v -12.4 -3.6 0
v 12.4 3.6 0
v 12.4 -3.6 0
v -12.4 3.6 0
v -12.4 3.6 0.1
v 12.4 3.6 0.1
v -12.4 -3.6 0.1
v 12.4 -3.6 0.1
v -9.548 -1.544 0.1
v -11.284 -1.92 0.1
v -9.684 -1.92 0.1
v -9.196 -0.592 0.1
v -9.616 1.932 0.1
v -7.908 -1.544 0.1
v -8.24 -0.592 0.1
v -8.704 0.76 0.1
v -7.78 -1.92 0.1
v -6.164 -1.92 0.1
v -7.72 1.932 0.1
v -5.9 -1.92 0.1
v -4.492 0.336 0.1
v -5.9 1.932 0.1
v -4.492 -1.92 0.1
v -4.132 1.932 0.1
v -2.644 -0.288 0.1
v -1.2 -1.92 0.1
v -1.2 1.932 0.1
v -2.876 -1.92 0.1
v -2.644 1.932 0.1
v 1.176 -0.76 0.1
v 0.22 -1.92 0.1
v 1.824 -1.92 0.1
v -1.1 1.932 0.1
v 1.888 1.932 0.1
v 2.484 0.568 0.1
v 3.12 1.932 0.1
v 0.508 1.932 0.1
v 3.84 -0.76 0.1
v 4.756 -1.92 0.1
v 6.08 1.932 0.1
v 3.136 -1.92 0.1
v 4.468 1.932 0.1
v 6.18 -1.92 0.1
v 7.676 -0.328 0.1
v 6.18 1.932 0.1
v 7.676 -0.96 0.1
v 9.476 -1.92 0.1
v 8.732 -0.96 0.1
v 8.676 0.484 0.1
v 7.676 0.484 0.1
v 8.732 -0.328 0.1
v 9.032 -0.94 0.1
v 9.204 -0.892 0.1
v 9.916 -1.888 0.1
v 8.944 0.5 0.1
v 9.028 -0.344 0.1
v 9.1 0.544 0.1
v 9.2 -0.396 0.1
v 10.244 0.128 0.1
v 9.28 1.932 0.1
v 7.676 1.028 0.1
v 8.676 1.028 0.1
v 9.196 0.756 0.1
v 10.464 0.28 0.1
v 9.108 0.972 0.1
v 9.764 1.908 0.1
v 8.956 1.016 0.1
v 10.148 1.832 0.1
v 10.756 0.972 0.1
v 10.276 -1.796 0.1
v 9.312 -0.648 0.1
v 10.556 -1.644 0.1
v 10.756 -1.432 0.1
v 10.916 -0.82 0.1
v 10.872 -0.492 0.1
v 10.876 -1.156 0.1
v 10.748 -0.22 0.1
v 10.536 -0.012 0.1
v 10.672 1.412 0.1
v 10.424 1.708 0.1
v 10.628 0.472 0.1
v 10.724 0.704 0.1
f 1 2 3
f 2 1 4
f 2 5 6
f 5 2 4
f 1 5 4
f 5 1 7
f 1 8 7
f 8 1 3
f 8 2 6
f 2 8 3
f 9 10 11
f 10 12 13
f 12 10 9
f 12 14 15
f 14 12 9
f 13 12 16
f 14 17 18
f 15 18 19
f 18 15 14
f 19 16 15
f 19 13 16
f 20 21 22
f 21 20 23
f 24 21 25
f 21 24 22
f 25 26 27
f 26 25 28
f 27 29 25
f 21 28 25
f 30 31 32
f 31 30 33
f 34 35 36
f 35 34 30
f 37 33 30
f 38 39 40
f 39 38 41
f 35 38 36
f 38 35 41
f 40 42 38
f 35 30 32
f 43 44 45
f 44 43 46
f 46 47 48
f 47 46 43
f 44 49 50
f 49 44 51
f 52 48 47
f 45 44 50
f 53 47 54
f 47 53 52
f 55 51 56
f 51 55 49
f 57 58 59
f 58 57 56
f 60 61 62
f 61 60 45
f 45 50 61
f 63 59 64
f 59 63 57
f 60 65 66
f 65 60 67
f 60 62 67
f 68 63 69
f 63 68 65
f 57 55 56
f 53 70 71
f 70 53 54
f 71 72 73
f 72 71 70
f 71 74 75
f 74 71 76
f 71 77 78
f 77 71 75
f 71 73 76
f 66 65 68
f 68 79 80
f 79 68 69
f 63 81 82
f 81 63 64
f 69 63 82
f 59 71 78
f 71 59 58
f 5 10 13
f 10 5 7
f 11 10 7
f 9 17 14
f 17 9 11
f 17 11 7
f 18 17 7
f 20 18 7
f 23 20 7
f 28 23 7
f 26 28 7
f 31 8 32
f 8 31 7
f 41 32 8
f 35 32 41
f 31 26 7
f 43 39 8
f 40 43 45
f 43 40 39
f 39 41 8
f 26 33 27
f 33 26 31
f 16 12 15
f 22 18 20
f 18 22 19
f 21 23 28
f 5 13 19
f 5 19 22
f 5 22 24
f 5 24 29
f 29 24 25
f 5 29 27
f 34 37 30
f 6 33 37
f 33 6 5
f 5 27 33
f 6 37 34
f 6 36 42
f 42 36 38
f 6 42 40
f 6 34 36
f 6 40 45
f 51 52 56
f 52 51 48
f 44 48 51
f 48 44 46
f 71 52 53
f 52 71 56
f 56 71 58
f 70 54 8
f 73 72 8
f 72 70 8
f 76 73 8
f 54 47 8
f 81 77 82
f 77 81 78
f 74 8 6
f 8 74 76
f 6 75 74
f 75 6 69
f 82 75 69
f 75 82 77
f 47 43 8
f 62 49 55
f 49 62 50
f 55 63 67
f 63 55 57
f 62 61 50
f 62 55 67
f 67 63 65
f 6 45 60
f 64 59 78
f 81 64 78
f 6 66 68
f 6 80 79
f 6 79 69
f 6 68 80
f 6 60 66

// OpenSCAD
// file: ../p/4-4edge.scad
use <../lib.scad>
$fa=1; $fs=0.2;
function ldraw_lib__4_4edge(realsolid=false) = [
// 0 Circle 1.0
// 0 Name: 4-4edge.dat
// 0 Author: James Jessiman
// 0 !LDRAW_ORG Primitive UPDATE 2017-01
// 0 !LICENSE Licensed under CC BY 2.0 and CC BY 4.0 : see CAreadme.txt
// 
// 0 BFC CERTIFY CCW
  [0,"BFC","CERTIFY"],
  [0,"BFC","CCW"],
// 
// 0 !HISTORY 1998-12-15 [PTadmin] Official Update 1998-10
// 0 !HISTORY 2005-12-28 [PTadmin] Official Update 2005-01
// 0 !HISTORY 2007-06-24 [PTadmin] Header formatted for Contributor Agreement
// 0 !HISTORY 2008-07-01 [PTadmin] Official Update 2008-01
// 0 !HISTORY 2017-01-15 [Steffen] BFCed
// 0 !HISTORY 2017-12-30 [PTadmin] Official Update 2017-01
// 
// 
// 2 24 1 0 0 0.9239 0 0.3827
  [2,24,1,0,0,0.9239,0,0.3827],
// 2 24 0.9239 0 0.3827 0.7071 0 0.7071
  [2,24,0.9239,0,0.3827,0.7071,0,0.7071],
// 2 24 0.7071 0 0.7071 0.3827 0 0.9239
  [2,24,0.7071,0,0.7071,0.3827,0,0.9239],
// 2 24 0.3827 0 0.9239 0 0 1
  [2,24,0.3827,0,0.9239,0,0,1],
// 2 24 0 0 1 -0.3827 0 0.9239
  [2,24,0,0,1,-0.3827,0,0.9239],
// 2 24 -0.3827 0 0.9239 -0.7071 0 0.7071
  [2,24,-0.3827,0,0.9239,-0.7071,0,0.7071],
// 2 24 -0.7071 0 0.7071 -0.9239 0 0.3827
  [2,24,-0.7071,0,0.7071,-0.9239,0,0.3827],
// 2 24 -0.9239 0 0.3827 -1 0 -0
  [2,24,-0.9239,0,0.3827,-1,0,-0],
// 2 24 -1 0 -0 -0.9239 0 -0.3827
  [2,24,-1,0,-0,-0.9239,0,-0.3827],
// 2 24 -0.9239 0 -0.3827 -0.7071 0 -0.7071
  [2,24,-0.9239,0,-0.3827,-0.7071,0,-0.7071],
// 2 24 -0.7071 0 -0.7071 -0.3827 0 -0.9239
  [2,24,-0.7071,0,-0.7071,-0.3827,0,-0.9239],
// 2 24 -0.3827 0 -0.9239 0 0 -1
  [2,24,-0.3827,0,-0.9239,0,0,-1],
// 2 24 0 0 -1 0.3827 0 -0.9239
  [2,24,0,0,-1,0.3827,0,-0.9239],
// 2 24 0.3827 0 -0.9239 0.7071 0 -0.7071
  [2,24,0.3827,0,-0.9239,0.7071,0,-0.7071],
// 2 24 0.7071 0 -0.7071 0.9239 0 -0.3827
  [2,24,0.7071,0,-0.7071,0.9239,0,-0.3827],
// 2 24 0.9239 0 -0.3827 1 0 0
  [2,24,0.9239,0,-0.3827,1,0,0],
];
module ldraw_lib__4_4edge(step=0, col=false, unit=2/5, alt=false, line=0.2, solid=!$preview)
    makepoly(ldraw_lib__4_4edge(solid), step=step, col=col, unit=unit, alt=alt, line=line, solid=solid);
ldraw_lib__4_4edge(line=0.2);
// file: ../p/4-4disc.scad
use <../lib.scad>
$fa=1; $fs=0.2;
function ldraw_lib__4_4disc(realsolid=false) = [
// 0 Disc 1.0
// 0 Name: 4-4disc.dat
// 0 Author: James Jessiman
// 0 !LDRAW_ORG Primitive UPDATE 2002-02
// 0 !LICENSE Licensed under CC BY 2.0 and CC BY 4.0 : see CAreadme.txt
// 
// 0 BFC CERTIFY CCW
  [0,"BFC","CERTIFY"],
  [0,"BFC","CCW"],
// 
// 0 !HISTORY 1998-12-15 [PTadmin] Official Update 1998-10
// 0 !HISTORY 2002-03-23 [sbliss] Added BFC statement
// 0 !HISTORY 2002-04-25 [PTadmin] Official Update 2002-02
// 0 !HISTORY 2007-06-24 [PTadmin] Header formatted for Contributor Agreement
// 0 !HISTORY 2008-07-01 [PTadmin] Official Update 2008-01
// 
// 
// 3 16 0 0 0 1 0 0 0.9239 0 0.3827
  [3,16,0,0,0,1,0,0,0.9239,0,0.3827],
// 3 16 0 0 0 0.9239 0 0.3827 0.7071 0 0.7071
  [3,16,0,0,0,0.9239,0,0.3827,0.7071,0,0.7071],
// 3 16 0 0 0 0.7071 0 0.7071 0.3827 0 0.9239
  [3,16,0,0,0,0.7071,0,0.7071,0.3827,0,0.9239],
// 3 16 0 0 0 0.3827 0 0.9239 0 0 1
  [3,16,0,0,0,0.3827,0,0.9239,0,0,1],
// 3 16 0 0 0 0 0 1 -0.3827 0 0.9239
  [3,16,0,0,0,0,0,1,-0.3827,0,0.9239],
// 3 16 0 0 0 -0.3827 0 0.9239 -0.7071 0 0.7071
  [3,16,0,0,0,-0.3827,0,0.9239,-0.7071,0,0.7071],
// 3 16 0 0 0 -0.7071 0 0.7071 -0.9239 0 0.3827
  [3,16,0,0,0,-0.7071,0,0.7071,-0.9239,0,0.3827],
// 3 16 0 0 0 -0.9239 0 0.3827 -1 0 -0
  [3,16,0,0,0,-0.9239,0,0.3827,-1,0,-0],
// 3 16 0 0 0 -1 0 -0 -0.9239 0 -0.3827
  [3,16,0,0,0,-1,0,-0,-0.9239,0,-0.3827],
// 3 16 0 0 0 -0.9239 0 -0.3827 -0.7071 0 -0.7071
  [3,16,0,0,0,-0.9239,0,-0.3827,-0.7071,0,-0.7071],
// 3 16 0 0 0 -0.7071 0 -0.7071 -0.3827 0 -0.9239
  [3,16,0,0,0,-0.7071,0,-0.7071,-0.3827,0,-0.9239],
// 3 16 0 0 0 -0.3827 0 -0.9239 0 0 -1
  [3,16,0,0,0,-0.3827,0,-0.9239,0,0,-1],
// 3 16 0 0 0 0 0 -1 0.3827 0 -0.9239
  [3,16,0,0,0,0,0,-1,0.3827,0,-0.9239],
// 3 16 0 0 0 0.3827 0 -0.9239 0.7071 0 -0.7071
  [3,16,0,0,0,0.3827,0,-0.9239,0.7071,0,-0.7071],
// 3 16 0 0 0 0.7071 0 -0.7071 0.9239 0 -0.3827
  [3,16,0,0,0,0.7071,0,-0.7071,0.9239,0,-0.3827],
// 3 16 0 0 0 0.9239 0 -0.3827 1 0 0
  [3,16,0,0,0,0.9239,0,-0.3827,1,0,0],
// 0
];
module ldraw_lib__4_4disc(step=0, col=false, unit=2/5, alt=false, line=0.2, solid=!$preview)
    makepoly(ldraw_lib__4_4disc(solid), step=step, col=col, unit=unit, alt=alt, line=line, solid=solid);
ldraw_lib__4_4disc(line=0.2);
// file: ../p/4-4cyli.scad
use <../lib.scad>
$fa=1; $fs=0.2;
function ldraw_lib__4_4cyli(realsolid=false) = [
// 0 Cylinder 1.0
// 0 Name: 4-4cyli.dat
// 0 Author: James Jessiman
// 0 !LDRAW_ORG Primitive UPDATE 2005-01
// 0 !LICENSE Licensed under CC BY 2.0 and CC BY 4.0 : see CAreadme.txt
// 
// 0 BFC CERTIFY CCW
  [0,"BFC","CERTIFY"],
  [0,"BFC","CCW"],
// 
// 0 !HISTORY 1998-12-15 [PTadmin] Official Update 1998-10
// 0 !HISTORY 2002-03-23 [sbliss] Added BFC statement; merged headers from files in distributions LDraw 0.27 and Complete.
// 0 !HISTORY 2002-04-25 [PTadmin] Official Update 2002-02
// 0 !HISTORY 2004-12-14 [guyvivan] BFC CCW
// 0 !HISTORY 2005-12-28 [PTadmin] Official Update 2005-01
// 0 !HISTORY 2007-06-24 [PTadmin] Header formatted for Contributor Agreement
// 0 !HISTORY 2008-07-01 [PTadmin] Official Update 2008-01
// 
// 
// 4 16 1 1 0 0.9239 1 0.3827 0.9239 0 0.3827 1 0 0
  [4,16,1,1,0,0.9239,1,0.3827,0.9239,0,0.3827,1,0,0],
// 5 24 1 0 0 1 1 0 0.9239 0 0.3827 0.9239 0 -0.3827
  [5,24,1,0,0,1,1,0,0.9239,0,0.3827,0.9239,0,-0.3827],
// 4 16 0.9239 1 0.3827 0.7071 1 0.7071 0.7071 0 0.7071 0.9239 0 0.3827
  [4,16,0.9239,1,0.3827,0.7071,1,0.7071,0.7071,0,0.7071,0.9239,0,0.3827],
// 5 24 0.9239 0 0.3827 0.9239 1 0.3827 0.7071 0 0.7071 1 0 0
  [5,24,0.9239,0,0.3827,0.9239,1,0.3827,0.7071,0,0.7071,1,0,0],
// 4 16 0.7071 1 0.7071 0.3827 1 0.9239 0.3827 0 0.9239 0.7071 0 0.7071
  [4,16,0.7071,1,0.7071,0.3827,1,0.9239,0.3827,0,0.9239,0.7071,0,0.7071],
// 5 24 0.7071 0 0.7071 0.7071 1 0.7071 0.3827 0 0.9239 0.9239 0 0.3827
  [5,24,0.7071,0,0.7071,0.7071,1,0.7071,0.3827,0,0.9239,0.9239,0,0.3827],
// 4 16 0.3827 1 0.9239 0 1 1 0 0 1 0.3827 0 0.9239
  [4,16,0.3827,1,0.9239,0,1,1,0,0,1,0.3827,0,0.9239],
// 5 24 0.3827 0 0.9239 0.3827 1 0.9239 0 0 1 0.7071 0 0.7071
  [5,24,0.3827,0,0.9239,0.3827,1,0.9239,0,0,1,0.7071,0,0.7071],
// 4 16 0 1 1 -0.3827 1 0.9239 -0.3827 0 0.9239 0 0 1
  [4,16,0,1,1,-0.3827,1,0.9239,-0.3827,0,0.9239,0,0,1],
// 5 24 0 0 1 0 1 1 -0.3827 0 0.9239 0.3827 0 0.9239
  [5,24,0,0,1,0,1,1,-0.3827,0,0.9239,0.3827,0,0.9239],
// 4 16 -0.3827 1 0.9239 -0.7071 1 0.7071 -0.7071 0 0.7071 -0.3827 0 0.9239
  [4,16,-0.3827,1,0.9239,-0.7071,1,0.7071,-0.7071,0,0.7071,-0.3827,0,0.9239],
// 5 24 -0.3827 0 0.9239 -0.3827 1 0.9239 -0.7071 0 0.7071 0 0 1
  [5,24,-0.3827,0,0.9239,-0.3827,1,0.9239,-0.7071,0,0.7071,0,0,1],
// 4 16 -0.7071 1 0.7071 -0.9239 1 0.3827 -0.9239 0 0.3827 -0.7071 0 0.7071
  [4,16,-0.7071,1,0.7071,-0.9239,1,0.3827,-0.9239,0,0.3827,-0.7071,0,0.7071],
// 5 24 -0.7071 0 0.7071 -0.7071 1 0.7071 -0.9239 0 0.3827 -0.3827 0 0.9239
  [5,24,-0.7071,0,0.7071,-0.7071,1,0.7071,-0.9239,0,0.3827,-0.3827,0,0.9239],
// 4 16 -0.9239 1 0.3827 -1 1 0 -1 0 0 -0.9239 0 0.3827
  [4,16,-0.9239,1,0.3827,-1,1,0,-1,0,0,-0.9239,0,0.3827],
// 5 24 -0.9239 0 0.3827 -0.9239 1 0.3827 -1 0 0 -0.7071 0 0.7071
  [5,24,-0.9239,0,0.3827,-0.9239,1,0.3827,-1,0,0,-0.7071,0,0.7071],
// 4 16 -1 1 0 -0.9239 1 -0.3827 -0.9239 0 -0.3827 -1 0 0
  [4,16,-1,1,0,-0.9239,1,-0.3827,-0.9239,0,-0.3827,-1,0,0],
// 5 24 -1 0 0 -1 1 0 -0.9239 0 -0.3827 -0.9239 0 0.3827
  [5,24,-1,0,0,-1,1,0,-0.9239,0,-0.3827,-0.9239,0,0.3827],
// 4 16 -0.9239 1 -0.3827 -0.7071 1 -0.7071 -0.7071 0 -0.7071 -0.9239 0 -0.3827
  [4,16,-0.9239,1,-0.3827,-0.7071,1,-0.7071,-0.7071,0,-0.7071,-0.9239,0,-0.3827],
// 5 24 -0.9239 0 -0.3827 -0.9239 1 -0.3827 -0.7071 0 -0.7071 -1 0 0
  [5,24,-0.9239,0,-0.3827,-0.9239,1,-0.3827,-0.7071,0,-0.7071,-1,0,0],
// 4 16 -0.7071 1 -0.7071 -0.3827 1 -0.9239 -0.3827 0 -0.9239 -0.7071 0 -0.7071
  [4,16,-0.7071,1,-0.7071,-0.3827,1,-0.9239,-0.3827,0,-0.9239,-0.7071,0,-0.7071],
// 5 24 -0.7071 0 -0.7071 -0.7071 1 -0.7071 -0.3827 0 -0.9239 -0.9239 0 -0.3827
  [5,24,-0.7071,0,-0.7071,-0.7071,1,-0.7071,-0.3827,0,-0.9239,-0.9239,0,-0.3827],
// 4 16 -0.3827 1 -0.9239 0 1 -1 0 0 -1 -0.3827 0 -0.9239
  [4,16,-0.3827,1,-0.9239,0,1,-1,0,0,-1,-0.3827,0,-0.9239],
// 5 24 -0.3827 0 -0.9239 -0.3827 1 -0.9239 0 0 -1 -0.7071 0 -0.7071
  [5,24,-0.3827,0,-0.9239,-0.3827,1,-0.9239,0,0,-1,-0.7071,0,-0.7071],
// 4 16 0 1 -1 0.3827 1 -0.9239 0.3827 0 -0.9239 0 0 -1
  [4,16,0,1,-1,0.3827,1,-0.9239,0.3827,0,-0.9239,0,0,-1],
// 5 24 0 0 -1 0 1 -1 0.3827 0 -0.9239 -0.3827 0 -0.9239
  [5,24,0,0,-1,0,1,-1,0.3827,0,-0.9239,-0.3827,0,-0.9239],
// 4 16 0.3827 1 -0.9239 0.7071 1 -0.7071 0.7071 0 -0.7071 0.3827 0 -0.9239
  [4,16,0.3827,1,-0.9239,0.7071,1,-0.7071,0.7071,0,-0.7071,0.3827,0,-0.9239],
// 5 24 0.3827 0 -0.9239 0.3827 1 -0.9239 0.7071 0 -0.7071 0 0 -1
  [5,24,0.3827,0,-0.9239,0.3827,1,-0.9239,0.7071,0,-0.7071,0,0,-1],
// 4 16 0.7071 1 -0.7071 0.9239 1 -0.3827 0.9239 0 -0.3827 0.7071 0 -0.7071
  [4,16,0.7071,1,-0.7071,0.9239,1,-0.3827,0.9239,0,-0.3827,0.7071,0,-0.7071],
// 5 24 0.7071 0 -0.7071 0.7071 1 -0.7071 0.9239 0 -0.3827 0.3827 0 -0.9239
  [5,24,0.7071,0,-0.7071,0.7071,1,-0.7071,0.9239,0,-0.3827,0.3827,0,-0.9239],
// 4 16 0.9239 1 -0.3827 1 1 0 1 0 0 0.9239 0 -0.3827
  [4,16,0.9239,1,-0.3827,1,1,0,1,0,0,0.9239,0,-0.3827],
// 5 24 0.9239 0 -0.3827 0.9239 1 -0.3827 1 0 0 0.7071 0 -0.7071
  [5,24,0.9239,0,-0.3827,0.9239,1,-0.3827,1,0,0,0.7071,0,-0.7071],
// 0
];
module ldraw_lib__4_4cyli(step=0, col=false, unit=2/5, alt=false, line=0.2, solid=!$preview)
    makepoly(ldraw_lib__4_4cyli(solid), step=step, col=col, unit=unit, alt=alt, line=line, solid=solid);
ldraw_lib__4_4cyli(line=0.2);
// file: ../p/stud3.scad
use <../lib.scad>
use <4-4cyli.scad>
use <4-4disc.scad>
use <4-4edge.scad>
$fa=1; $fs=0.2;
function ldraw_lib__stud3(realsolid=false) = realsolid ? 
    [openscad(translate([0,0,-eps()], o=cylinder(4+eps(), r=4)),2)] : [
// 0 Stud Tube Solid
// 0 Name: stud3.dat
// 0 Author: James Jessiman
// 0 !LDRAW_ORG Primitive UPDATE 2012-01
// 0 !LICENSE Licensed under CC BY 2.0 and CC BY 4.0 : see CAreadme.txt
// 
// 0 BFC CERTIFY CCW
  [0,"BFC","CERTIFY"],
  [0,"BFC","CCW"],
// 
// 0 !HISTORY 2002-04-04 [sbliss] Modified for BFC compliance
// 0 !HISTORY 2002-04-25 [PTadmin] Official Update 2002-02
// 0 !HISTORY 2007-06-24 [PTadmin] Header formatted for Contributor Agreement
// 0 !HISTORY 2008-07-01 [PTadmin] Official Update 2008-01
// 0 !HISTORY 2012-02-16 [Philo] Changed to CCW
// 0 !HISTORY 2012-03-30 [PTadmin] Official Update 2012-01
// 
// 
// 1 16 0 -4 0 4 0 0 0 1 0 0 0 4 4-4edge.dat
  [1,16,0,-4,0,4,0,0,0,1,0,0,0,4, ldraw_lib__4_4edge(realsolid)],
// 1 16 0 0 0 4 0 0 0 1 0 0 0 4 4-4edge.dat
  [1,16,0,0,0,4,0,0,0,1,0,0,0,4, ldraw_lib__4_4edge(realsolid)],
// 1 16 0 -4 0 4 0 0 0 1 0 0 0 4 4-4disc.dat
  [1,16,0,-4,0,4,0,0,0,1,0,0,0,4, ldraw_lib__4_4disc(realsolid)],
// 1 16 0 -4 0 4 0 0 0 4 0 0 0 4 4-4cyli.dat
  [1,16,0,-4,0,4,0,0,0,4,0,0,0,4, ldraw_lib__4_4cyli(realsolid)],
];
module ldraw_lib__stud3(step=0, col=false, unit=2/5, alt=false, line=0.2, solid=!$preview)
    makepoly(ldraw_lib__stud3(solid), step=step, col=col, unit=unit, alt=alt, line=line, solid=solid);
ldraw_lib__stud3(line=0.2);
// file: ../p/stud.scad
use <../lib.scad>
use <4-4cyli.scad>
use <4-4disc.scad>
use <4-4edge.scad>
$fa=1; $fs=0.2;
function ldraw_lib__stud(realsolid=false) = realsolid ? 
    [openscad(translate([0,0,-eps()], o=cylinder(4+eps(), r=6)),2)] : [
// 0 Stud
// 0 Name: stud.dat
// 0 Author: James Jessiman
// 0 !LDRAW_ORG Primitive UPDATE 2012-01
// 0 !LICENSE Licensed under CC BY 2.0 and CC BY 4.0 : see CAreadme.txt
// 
// 0 BFC CERTIFY CCW
  [0,"BFC","CERTIFY"],
  [0,"BFC","CCW"],
// 
// 0 !HISTORY 2002-04-04 [sbliss] Modified for BFC compliance
// 0 !HISTORY 2002-04-25 [PTadmin] Official Update 2002-02
// 0 !HISTORY 2007-06-24 [PTadmin] Header formatted for Contributor Agreement
// 0 !HISTORY 2008-07-01 [PTadmin] Official Update 2008-01
// 0 !HISTORY 2012-02-16 [Philo] Changed to CCW
// 0 !HISTORY 2012-03-30 [PTadmin] Official Update 2012-01
// 
// 
// 1 16 0 0 0 6 0 0 0 1 0 0 0 6 4-4edge.dat
  [1,16,0,0,0,6,0,0,0,1,0,0,0,6, ldraw_lib__4_4edge(realsolid)],
// 1 16 0 -4 0 6 0 0 0 1 0 0 0 6 4-4edge.dat
  [1,16,0,-4,0,6,0,0,0,1,0,0,0,6, ldraw_lib__4_4edge(realsolid)],
// 1 16 0 0 0 6 0 0 0 -4 0 0 0 6 4-4cyli.dat
  [1,16,0,0,0,6,0,0,0,-4,0,0,0,6, ldraw_lib__4_4cyli(realsolid)],
// 1 16 0 -4 0 6 0 0 0 1 0 0 0 6 4-4disc.dat
  [1,16,0,-4,0,6,0,0,0,1,0,0,0,6, ldraw_lib__4_4disc(realsolid)],
];
module ldraw_lib__stud(step=0, col=false, unit=2/5, alt=false, line=0.2, solid=!$preview)
    makepoly(ldraw_lib__stud(solid), step=step, col=col, unit=unit, alt=alt, line=line, solid=solid);
ldraw_lib__stud(line=0.2);
// file: ../p/box5.scad
use <../lib.scad>
$fa=1; $fs=0.2;
function ldraw_lib__box5(realsolid=false) = [
// 0 Box with 5 Faces and All Edges
// 0 Name: box5.dat
// 0 Author: James Jessiman
// 0 !LDRAW_ORG Primitive UPDATE 2012-01
// 0 !LICENSE Licensed under CC BY 2.0 and CC BY 4.0 : see CAreadme.txt
// 
// 0 BFC CERTIFY CCW
  [0,"BFC","CERTIFY"],
  [0,"BFC","CCW"],
// 
// 0 !HISTORY 2002-04-03 [sbliss] Modified for BFC compliance
// 0 !HISTORY 2002-04-25 [PTadmin] Official Update 2002-02
// 0 !HISTORY 2007-06-24 [PTadmin] Header formatted for Contributor Agreement
// 0 !HISTORY 2008-07-01 [PTadmin] Official Update 2008-01
// 0 !HISTORY 2012-02-16 [Philo] Changed to CCW
// 0 !HISTORY 2012-03-30 [PTadmin] Official Update 2012-01
// 
// 
// 2 24 1 1 1 -1 1 1
  [2,24,1,1,1,-1,1,1],
// 2 24 -1 1 1 -1 1 -1
  [2,24,-1,1,1,-1,1,-1],
// 2 24 -1 1 -1 1 1 -1
  [2,24,-1,1,-1,1,1,-1],
// 2 24 1 1 -1 1 1 1
  [2,24,1,1,-1,1,1,1],
// 2 24 1 0 1 -1 0 1
  [2,24,1,0,1,-1,0,1],
// 2 24 -1 0 1 -1 0 -1
  [2,24,-1,0,1,-1,0,-1],
// 2 24 -1 0 -1 1 0 -1
  [2,24,-1,0,-1,1,0,-1],
// 2 24 1 0 -1 1 0 1
  [2,24,1,0,-1,1,0,1],
// 2 24 1 0 1 1 1 1
  [2,24,1,0,1,1,1,1],
// 2 24 -1 0 1 -1 1 1
  [2,24,-1,0,1,-1,1,1],
// 2 24 1 0 -1 1 1 -1
  [2,24,1,0,-1,1,1,-1],
// 2 24 -1 0 -1 -1 1 -1
  [2,24,-1,0,-1,-1,1,-1],
// 4 16 -1 1 1 1 1 1 1 1 -1 -1 1 -1
  [4,16,-1,1,1,1,1,1,1,1,-1,-1,1,-1],
// 4 16 -1 1 1 -1 0 1 1 0 1 1 1 1
  [4,16,-1,1,1,-1,0,1,1,0,1,1,1,1],
// 4 16 -1 1 -1 -1 0 -1 -1 0 1 -1 1 1
  [4,16,-1,1,-1,-1,0,-1,-1,0,1,-1,1,1],
// 4 16 1 1 -1 1 0 -1 -1 0 -1 -1 1 -1
  [4,16,1,1,-1,1,0,-1,-1,0,-1,-1,1,-1],
// 4 16 1 1 1 1 0 1 1 0 -1 1 1 -1
  [4,16,1,1,1,1,0,1,1,0,-1,1,1,-1],
];
module ldraw_lib__box5(step=0, col=false, unit=2/5, alt=false, line=0.2, solid=!$preview)
    makepoly(ldraw_lib__box5(solid), step=step, col=col, unit=unit, alt=alt, line=line, solid=solid);
ldraw_lib__box5(line=0.2);
// file: ../p/box4t.scad
use <../lib.scad>
$fa=1; $fs=0.2;
function ldraw_lib__box4t(realsolid=false) = [
// 0 Box with 4 Adjacent Faces and All Edges
// 0 Name: box4t.dat
// 0 Author: Tore Eriksson [Tore_Eriksson]
// 0 !LDRAW_ORG Primitive UPDATE 2003-02
// 0 !LICENSE Licensed under CC BY 2.0 and CC BY 4.0 : see CAreadme.txt
// 
// 0 BFC CERTIFY CCW
  [0,"BFC","CERTIFY"],
  [0,"BFC","CCW"],
// 
// 0 !HISTORY 1997-09-29 [PTadmin] Official Update 1997-15
// 0 !HISTORY 2002-08-31 [izanette] Modified with WINDZ for BFC compliance
// 0 !HISTORY 2003-08-01 [PTadmin] Official Update 2003-02
// 0 !HISTORY 2007-06-24 [PTadmin] Header formatted for Contributor Agreement
// 0 !HISTORY 2008-07-01 [PTadmin] Official Update 2008-01
// 
// 
// 2 24 1 1 1 -1 1 1
  [2,24,1,1,1,-1,1,1],
// 2 24 -1 1 1 -1 1 -1
  [2,24,-1,1,1,-1,1,-1],
// 2 24 -1 1 -1 1 1 -1
  [2,24,-1,1,-1,1,1,-1],
// 2 24 1 1 -1 1 1 1
  [2,24,1,1,-1,1,1,1],
// 2 24 1 0 1 -1 0 1
  [2,24,1,0,1,-1,0,1],
// 2 24 -1 0 1 -1 0 -1
  [2,24,-1,0,1,-1,0,-1],
// 2 24 -1 0 -1 1 0 -1
  [2,24,-1,0,-1,1,0,-1],
// 2 24 1 0 -1 1 0 1
  [2,24,1,0,-1,1,0,1],
// 2 24 1 0 1 1 1 1
  [2,24,1,0,1,1,1,1],
// 2 24 -1 0 1 -1 1 1
  [2,24,-1,0,1,-1,1,1],
// 2 24 1 0 -1 1 1 -1
  [2,24,1,0,-1,1,1,-1],
// 2 24 -1 0 -1 -1 1 -1
  [2,24,-1,0,-1,-1,1,-1],
// 4 16 1 1 1 1 1 -1 -1 1 -1 -1 1 1
  [4,16,1,1,1,1,1,-1,-1,1,-1,-1,1,1],
// 4 16 1 1 1 -1 1 1 -1 0 1 1 0 1
  [4,16,1,1,1,-1,1,1,-1,0,1,1,0,1],
// 4 16 -1 1 1 -1 1 -1 -1 0 -1 -1 0 1
  [4,16,-1,1,1,-1,1,-1,-1,0,-1,-1,0,1],
// 0 4 16 -1 1 -1 -1 0 -1 1 0 -1 1 1 -1
// 4 16 1 1 -1 1 1 1 1 0 1 1 0 -1
  [4,16,1,1,-1,1,1,1,1,0,1,1,0,-1],
// 0
];
module ldraw_lib__box4t(step=0, col=false, unit=2/5, alt=false, line=0.2, solid=!$preview)
    makepoly(ldraw_lib__box4t(solid), step=step, col=col, unit=unit, alt=alt, line=line, solid=solid);
ldraw_lib__box4t(line=0.2);
// file: s/3004s01.scad
use <../../lib.scad>
use <../../p/box4t.scad>
use <../../p/box5.scad>
use <../../p/stud.scad>
use <../../p/stud3.scad>
$fa=1; $fs=0.2;
function ldraw_lib__s__3004s01(realsolid=false) = [
// 0 ~Brick  1 x  2 without Front Face
// 0 Name: s\3004s01.dat
// 0 Author: James Jessiman
// 0 !LDRAW_ORG Subpart UPDATE 2003-03
// 0 !LICENSE Licensed under CC BY 2.0 and CC BY 4.0 : see CAreadme.txt
// 
// 0 BFC CERTIFY CCW
  [0,"BFC","CERTIFY"],
  [0,"BFC","CCW"],
// 
// 0 !HISTORY 2003-09-07 [jriley] Subfiling, BFC
// 0 !HISTORY 2003-12-19 [PTadmin] Official Update 2003-03
// 0 !HISTORY 2007-08-29 [PTadmin] Header formatted for Contributor Agreement
// 0 !HISTORY 2008-07-01 [PTadmin] Official Update 2008-01
// 
// 
// 1 16 0 4 0 1 0 0 0 -5 0 0 0 1 stud3.dat
  [1,16,0,4,0,1,0,0,0,-5,0,0,0,1, ldraw_lib__stud3(realsolid)],
// 0 BFC INVERTNEXT
  [0,"BFC","INVERTNEXT"],
// 1 16 0 24 0 16 0 0 0 -20 0 0 0 6 box5.dat
  [1,16,0,24,0,16,0,0,0,-20,0,0,0,6, ldraw_lib__box5(realsolid)],
// 4 16 20 24 10 16 24 6 -16 24 6 -20 24 10
  [4,16,20,24,10,16,24,6,-16,24,6,-20,24,10],
// 4 16 -20 24 10 -16 24 6 -16 24 -6 -20 24 -10
  [4,16,-20,24,10,-16,24,6,-16,24,-6,-20,24,-10],
// 4 16 -20 24 -10 -16 24 -6 16 24 -6 20 24 -10
  [4,16,-20,24,-10,-16,24,-6,16,24,-6,20,24,-10],
// 4 16 20 24 -10 16 24 -6 16 24 6 20 24 10
  [4,16,20,24,-10,16,24,-6,16,24,6,20,24,10],
// 1 16 0 24 0 20 0 0 0 -24 0 0 0 10 box4t.dat
  [1,16,0,24,0,20,0,0,0,-24,0,0,0,10, ldraw_lib__box4t(realsolid)],
// 1 16 10 0 0 1 0 0 0 1 0 0 0 1 stud.dat
  [1,16,10,0,0,1,0,0,0,1,0,0,0,1, ldraw_lib__stud(realsolid)],
// 1 16 -10 0 0 1 0 0 0 1 0 0 0 1 stud.dat
  [1,16,-10,0,0,1,0,0,0,1,0,0,0,1, ldraw_lib__stud(realsolid)],
// 0
];
module ldraw_lib__s__3004s01(step=0, col=false, unit=2/5, alt=false, line=0.2, solid=!$preview)
    makepoly(ldraw_lib__s__3004s01(solid), step=step, col=col, unit=unit, alt=alt, line=line, solid=solid);
ldraw_lib__s__3004s01(line=0.2);
// file: 3004.scad
use <../lib.scad>
use <s/3004s01.scad>
$fa=1; $fs=0.2;
function ldraw_lib__3004(realsolid=false) = [
// 0 Brick  1 x  2
// 0 Name: 3004.dat
// 0 Author: James Jessiman
// 0 !LDRAW_ORG Part UPDATE 2022-05
// 0 !LICENSE Licensed under CC BY 2.0 and CC BY 4.0 : see CAreadme.txt
// 
// 0 BFC CERTIFY CCW
  [0,"BFC","CERTIFY"],
  [0,"BFC","CCW"],
// 
// 0 !HISTORY 2001-10-26 [PTadmin] Official Update 2001-01
// 0 !HISTORY 2002-05-07 {unknown} BFC Certification
// 0 !HISTORY 2002-06-11 [PTadmin] Official Update 2002-03
// 0 !HISTORY 2007-05-07 [PTadmin] Header formatted for Contributor Agreement
// 0 !HISTORY 2008-07-01 [PTadmin] Official Update 2008-01
// 0 !HISTORY 2022-08-04 [MagFors] Using subfile
// 0 !HISTORY 2022-09-15 [PTadmin] Official Update 2022-05
// 
// 
// 1 16 0 0 0 1 0 0 0 1 0 0 0 1 s\3004s01.dat
  [1,16,0,0,0,1,0,0,0,1,0,0,0,1, ldraw_lib__s__3004s01(realsolid)],
// 4 16 -20 24 -10 20 24 -10 20 0 -10 -20 0 -10
  [4,16,-20,24,-10,20,24,-10,20,0,-10,-20,0,-10],
];
module ldraw_lib__3004(step=0, col=false, unit=2/5, alt=false, line=0.2, solid=!$preview)
    makepoly(ldraw_lib__3004(solid), step=step, col=col, unit=unit, alt=alt, line=line, solid=solid);
ldraw_lib__3004(line=0.2);
// file: ../p/box5-12.scad
use <../lib.scad>
$fa=1; $fs=0.2;
function ldraw_lib__box5_12(realsolid=false) = [
// 0 Box with 5 Faces without Any Edges
// 0 Name: box5-12.dat
// 0 Author: Chris Dee [cwdee]
// 0 !LDRAW_ORG Primitive UPDATE 2009-02
// 0 !LICENSE Licensed under CC BY 2.0 and CC BY 4.0 : see CAreadme.txt
// 
// 0 BFC CERTIFY CCW
  [0,"BFC","CERTIFY"],
  [0,"BFC","CCW"],
// 
// 0 !HISTORY 2009-09-03 [PTadmin] Official Update 2009-02
// 
// 
// 4 16 1 1 1 1 1 -1 -1 1 -1 -1 1 1
  [4,16,1,1,1,1,1,-1,-1,1,-1,-1,1,1],
// 4 16 -1 0 1 1 0 1 1 1 1 -1 1 1
  [4,16,-1,0,1,1,0,1,1,1,1,-1,1,1],
// 4 16 -1 0 -1 -1 0 1 -1 1 1 -1 1 -1
  [4,16,-1,0,-1,-1,0,1,-1,1,1,-1,1,-1],
// 4 16 1 0 -1 -1 0 -1 -1 1 -1 1 1 -1
  [4,16,1,0,-1,-1,0,-1,-1,1,-1,1,1,-1],
// 4 16 1 0 1 1 0 -1 1 1 -1 1 1 1
  [4,16,1,0,1,1,0,-1,1,1,-1,1,1,1],
// 0
];
module ldraw_lib__box5_12(step=0, col=false, unit=2/5, alt=false, line=0.2, solid=!$preview)
    makepoly(ldraw_lib__box5_12(solid), step=step, col=col, unit=unit, alt=alt, line=line, solid=solid);
ldraw_lib__box5_12(line=0.2);
// main file
use <../lib.scad>
use <../p/box5-12.scad>
$fa=1; $fs=0.2;
function ldraw_lib__194535c(realsolid=false) = [
// 0 Sticker  0.9 x  3.1 with White "ANWB" on Blue Background
// 0 Name: 194535c.dat
// 0 Author: Takeshi Takahashi [RainbowDolphin]
// 0 !LDRAW_ORG Part UPDATE 2023-01
// 0 !LICENSE Licensed under CC BY 2.0 and CC BY 4.0 : see CAreadme.txt
// 
// 0 BFC CERTIFY CCW
  [0,"BFC","CERTIFY"],
  [0,"BFC","CCW"],
// 
// 0 !KEYWORDS Bricklink 1590.2stk01, Brickowl 599539, Netherlands
// 0 !KEYWORDS Rebrickable 194535, Road service, Set 1590-2
// 
// 0 !HISTORY 2023-03-05 [OrionP] Official Update 2023-01
// 
// 
// 1 16 0 -0.25 0 31 0 0 0 0.25 0 0 0 9 box5-12.dat
  [1,16,0,-0.25,0,31,0,0,0,0.25,0,0,0,9, ldraw_lib__box5_12(realsolid)],
// 3 15 -23.87 -0.25 -3.86 -28.21 -0.25 -4.8 -24.21 -0.25 -4.8
  [3,15,-23.87,-0.25,-3.86,-28.21,-0.25,-4.8,-24.21,-0.25,-4.8],
// 4 15 -22.99 -0.25 -1.48 -24.04 -0.25 4.83 -28.21 -0.25 -4.8 -23.87 -0.25 -3.86
  [4,15,-22.99,-0.25,-1.48,-24.04,-0.25,4.83,-28.21,-0.25,-4.8,-23.87,-0.25,-3.86],
// 4 15 -22.99 -0.25 -1.48 -23.87 -0.25 -3.86 -19.77 -0.25 -3.86 -20.6 -0.25 -1.48
  [4,15,-22.99,-0.25,-1.48,-23.87,-0.25,-3.86,-19.77,-0.25,-3.86,-20.6,-0.25,-1.48],
// 3 15 -24.04 -0.25 4.83 -22.99 -0.25 -1.48 -21.76 -0.25 1.9
  [3,15,-24.04,-0.25,4.83,-22.99,-0.25,-1.48,-21.76,-0.25,1.9],
// 3 15 -19.77 -0.25 -3.86 -19.45 -0.25 -4.8 -15.41 -0.25 -4.8
  [3,15,-19.77,-0.25,-3.86,-19.45,-0.25,-4.8,-15.41,-0.25,-4.8],
// 4 15 -20.6 -0.25 -1.48 -19.77 -0.25 -3.86 -15.41 -0.25 -4.8 -19.3 -0.25 4.83
  [4,15,-20.6,-0.25,-1.48,-19.77,-0.25,-3.86,-15.41,-0.25,-4.8,-19.3,-0.25,4.83],
// 3 15 -19.3 -0.25 4.83 -21.76 -0.25 1.9 -20.6 -0.25 -1.48
  [3,15,-19.3,-0.25,4.83,-21.76,-0.25,1.9,-20.6,-0.25,-1.48],
// 3 15 -19.3 -0.25 4.83 -24.04 -0.25 4.83 -21.76 -0.25 1.9
  [3,15,-19.3,-0.25,4.83,-24.04,-0.25,4.83,-21.76,-0.25,1.9],
// 4 15 -14.75 -0.25 -4.8 -11.23 -0.25 -4.8 -11.23 -0.25 0.84 -14.75 -0.25 4.83
  [4,15,-14.75,-0.25,-4.8,-11.23,-0.25,-4.8,-11.23,-0.25,0.84,-14.75,-0.25,4.83],
// 4 15 -10.33 -0.25 4.83 -14.75 -0.25 4.83 -11.23 -0.25 0.84 -6.61 -0.25 -0.72
  [4,15,-10.33,-0.25,4.83,-14.75,-0.25,4.83,-11.23,-0.25,0.84,-6.61,-0.25,-0.72],
// 4 15 -6.61 -0.25 -0.72 -7.19 -0.25 -4.8 -3 -0.25 -4.8 -3 -0.25 4.83
  [4,15,-6.61,-0.25,-0.72,-7.19,-0.25,-4.8,-3,-0.25,-4.8,-3,-0.25,4.83],
// 3 15 -3 -0.25 4.83 -6.61 -0.25 4.83 -6.61 -0.25 -0.72
  [3,15,-3,-0.25,4.83,-6.61,-0.25,4.83,-6.61,-0.25,-0.72],
// 3 15 -11.23 -0.25 0.84 -7.19 -0.25 -4.8 -6.61 -0.25 -0.72
  [3,15,-11.23,-0.25,0.84,-7.19,-0.25,-4.8,-6.61,-0.25,-0.72],
// 4 15 0.55 -0.25 -4.8 4.56 -0.25 -4.8 2.94 -0.25 -1.9 -2.75 -0.25 4.83
  [4,15,0.55,-0.25,-4.8,4.56,-0.25,-4.8,2.94,-0.25,-1.9,-2.75,-0.25,4.83],
// 4 15 4.72 -0.25 4.83 2.94 -0.25 -1.9 6.21 -0.25 1.42 7.8 -0.25 4.83
  [4,15,4.72,-0.25,4.83,2.94,-0.25,-1.9,6.21,-0.25,1.42,7.8,-0.25,4.83],
// 3 15 1.27 -0.25 4.83 -2.75 -0.25 4.83 2.94 -0.25 -1.9
  [3,15,1.27,-0.25,4.83,-2.75,-0.25,4.83,2.94,-0.25,-1.9],
// 4 15 9.6 -0.25 -1.9 7.84 -0.25 -4.8 11.89 -0.25 -4.8 15.2 -0.25 4.83
  [4,15,9.6,-0.25,-1.9,7.84,-0.25,-4.8,11.89,-0.25,-4.8,15.2,-0.25,4.83],
// 4 15 6.21 -0.25 1.42 7.84 -0.25 -4.8 9.6 -0.25 -1.9 7.8 -0.25 4.83
  [4,15,6.21,-0.25,1.42,7.84,-0.25,-4.8,9.6,-0.25,-1.9,7.8,-0.25,4.83],
// 3 15 15.2 -0.25 4.83 11.17 -0.25 4.83 9.6 -0.25 -1.9
  [3,15,15.2,-0.25,4.83,11.17,-0.25,4.83,9.6,-0.25,-1.9],
// 3 15 6.21 -0.25 1.42 2.94 -0.25 -1.9 4.56 -0.25 -4.8
  [3,15,6.21,-0.25,1.42,2.94,-0.25,-1.9,4.56,-0.25,-4.8],
// 4 15 15.45 -0.25 -4.8 19.19 -0.25 -2.4 19.19 -0.25 -0.82 15.45 -0.25 4.83
  [4,15,15.45,-0.25,-4.8,19.19,-0.25,-2.4,19.19,-0.25,-0.82,15.45,-0.25,4.83],
// 4 15 23.69 -0.25 -4.8 21.83 -0.25 -2.4 19.19 -0.25 -2.4 15.45 -0.25 -4.8
  [4,15,23.69,-0.25,-4.8,21.83,-0.25,-2.4,19.19,-0.25,-2.4,15.45,-0.25,-4.8],
// 4 15 21.69 -0.25 1.21 19.19 -0.25 1.21 19.19 -0.25 -0.82 21.83 -0.25 -0.82
  [4,15,21.69,-0.25,1.21,19.19,-0.25,1.21,19.19,-0.25,-0.82,21.83,-0.25,-0.82],
// 3 15 22.58 -0.25 -2.35 21.83 -0.25 -2.4 23.69 -0.25 -4.8
  [3,15,22.58,-0.25,-2.35,21.83,-0.25,-2.4,23.69,-0.25,-4.8],
// 3 15 15.45 -0.25 4.83 19.19 -0.25 -0.82 19.19 -0.25 1.21
  [3,15,15.45,-0.25,4.83,19.19,-0.25,-0.82,19.19,-0.25,1.21],
// 4 15 23.01 -0.25 -2.23 22.58 -0.25 -2.35 23.69 -0.25 -4.8 24.79 -0.25 -4.72
  [4,15,23.01,-0.25,-2.23,22.58,-0.25,-2.35,23.69,-0.25,-4.8,24.79,-0.25,-4.72],
// 4 15 21.83 -0.25 -0.82 22.57 -0.25 -0.86 22.36 -0.25 1.25 21.69 -0.25 1.21
  [4,15,21.83,-0.25,-0.82,22.57,-0.25,-0.86,22.36,-0.25,1.25,21.69,-0.25,1.21],
// 4 15 23 -0.25 -0.99 25.61 -0.25 0.32 22.75 -0.25 1.36 22.57 -0.25 -0.86
  [4,15,23,-0.25,-0.99,25.61,-0.25,0.32,22.75,-0.25,1.36,22.57,-0.25,-0.86],
// 4 15 23.2 -0.25 4.83 15.45 -0.25 4.83 19.19 -0.25 2.57 21.69 -0.25 2.57
  [4,15,23.2,-0.25,4.83,15.45,-0.25,4.83,19.19,-0.25,2.57,21.69,-0.25,2.57],
// 3 15 15.45 -0.25 4.83 19.19 -0.25 1.21 19.19 -0.25 2.57
  [3,15,15.45,-0.25,4.83,19.19,-0.25,1.21,19.19,-0.25,2.57],
// 4 15 22.99 -0.25 1.89 22.75 -0.25 1.36 25.61 -0.25 0.32 26.16 -0.25 0.7
  [4,15,22.99,-0.25,1.89,22.75,-0.25,1.36,25.61,-0.25,0.32,26.16,-0.25,0.7],
// 4 15 23.2 -0.25 4.83 22.39 -0.25 2.54 22.77 -0.25 2.43 24.41 -0.25 4.77
  [4,15,23.2,-0.25,4.83,22.39,-0.25,2.54,22.77,-0.25,2.43,24.41,-0.25,4.77],
// 3 15 23.2 -0.25 4.83 21.69 -0.25 2.57 22.39 -0.25 2.54
  [3,15,23.2,-0.25,4.83,21.69,-0.25,2.57,22.39,-0.25,2.54],
// 4 15 25.37 -0.25 4.58 22.77 -0.25 2.43 22.99 -0.25 1.89 26.89 -0.25 2.43
  [4,15,25.37,-0.25,4.58,22.77,-0.25,2.43,22.99,-0.25,1.89,26.89,-0.25,2.43],
// 3 15 22.75 -0.25 1.36 22.36 -0.25 1.25 22.57 -0.25 -0.86
  [3,15,22.75,-0.25,1.36,22.36,-0.25,1.25,22.57,-0.25,-0.86],
// 4 15 23.01 -0.25 -2.23 24.79 -0.25 -4.72 25.69 -0.25 -4.49 23.28 -0.25 -1.62
  [4,15,23.01,-0.25,-2.23,24.79,-0.25,-4.72,25.69,-0.25,-4.49,23.28,-0.25,-1.62],
// 4 15 23.28 -0.25 -1.62 25.69 -0.25 -4.49 26.39 -0.25 -4.11 26.89 -0.25 -3.58
  [4,15,23.28,-0.25,-1.62,25.69,-0.25,-4.49,26.39,-0.25,-4.11,26.89,-0.25,-3.58],
// 4 15 23.28 -0.25 -1.62 27.19 -0.25 -2.89 27.29 -0.25 -2.05 27.18 -0.25 -1.23
  [4,15,23.28,-0.25,-1.62,27.19,-0.25,-2.89,27.29,-0.25,-2.05,27.18,-0.25,-1.23],
// 4 15 23.28 -0.25 -1.62 27.18 -0.25 -1.23 26.87 -0.25 -0.55 26.34 -0.25 -0.03
  [4,15,23.28,-0.25,-1.62,27.18,-0.25,-1.23,26.87,-0.25,-0.55,26.34,-0.25,-0.03],
// 3 15 23.28 -0.25 -1.62 26.89 -0.25 -3.58 27.19 -0.25 -2.89
  [3,15,23.28,-0.25,-1.62,26.89,-0.25,-3.58,27.19,-0.25,-2.89],
// 3 15 24.41 -0.25 4.77 22.77 -0.25 2.43 25.37 -0.25 4.58
  [3,15,24.41,-0.25,4.77,22.77,-0.25,2.43,25.37,-0.25,4.58],
// 4 15 26.68 -0.25 3.53 26.06 -0.25 4.27 25.37 -0.25 4.58 26.89 -0.25 2.43
  [4,15,26.68,-0.25,3.53,26.06,-0.25,4.27,25.37,-0.25,4.58,26.89,-0.25,2.43],
// 4 15 22.99 -0.25 1.89 26.16 -0.25 0.7 26.57 -0.25 1.18 26.81 -0.25 1.76
  [4,15,22.99,-0.25,1.89,26.16,-0.25,0.7,26.57,-0.25,1.18,26.81,-0.25,1.76],
// 3 15 26.89 -0.25 2.43 22.99 -0.25 1.89 26.81 -0.25 1.76
  [3,15,26.89,-0.25,2.43,22.99,-0.25,1.89,26.81,-0.25,1.76],
// 4 15 23.28 -0.25 -1.62 26.34 -0.25 -0.03 25.61 -0.25 0.32 23 -0.25 -0.99
  [4,15,23.28,-0.25,-1.62,26.34,-0.25,-0.03,25.61,-0.25,0.32,23,-0.25,-0.99],
// 4 1 -31 -0.25 9 -31 -0.25 -9 -28.21 -0.25 -4.8 -24.04 -0.25 4.83
  [4,1,-31,-0.25,9,-31,-0.25,-9,-28.21,-0.25,-4.8,-24.04,-0.25,4.83],
// 3 1 -24.21 -0.25 -4.8 -28.21 -0.25 -4.8 -31 -0.25 -9
  [3,1,-24.21,-0.25,-4.8,-28.21,-0.25,-4.8,-31,-0.25,-9],
// 4 1 -23.87 -0.25 -3.86 -24.21 -0.25 -4.8 -19.45 -0.25 -4.8 -19.77 -0.25 -3.86
  [4,1,-23.87,-0.25,-3.86,-24.21,-0.25,-4.8,-19.45,-0.25,-4.8,-19.77,-0.25,-3.86],
// 3 1 -19.45 -0.25 -4.8 -24.21 -0.25 -4.8 -31 -0.25 -9
  [3,1,-19.45,-0.25,-4.8,-24.21,-0.25,-4.8,-31,-0.25,-9],
// 3 1 -15.41 -0.25 -4.8 -19.45 -0.25 -4.8 -31 -0.25 -9
  [3,1,-15.41,-0.25,-4.8,-19.45,-0.25,-4.8,-31,-0.25,-9],
// 3 1 -14.75 -0.25 -4.8 -15.41 -0.25 -4.8 -31 -0.25 -9
  [3,1,-14.75,-0.25,-4.8,-15.41,-0.25,-4.8,-31,-0.25,-9],
// 3 1 -11.23 -0.25 -4.8 -14.75 -0.25 -4.8 -31 -0.25 -9
  [3,1,-11.23,-0.25,-4.8,-14.75,-0.25,-4.8,-31,-0.25,-9],
// 3 1 -7.19 -0.25 -4.8 -11.23 -0.25 -4.8 -31 -0.25 -9
  [3,1,-7.19,-0.25,-4.8,-11.23,-0.25,-4.8,-31,-0.25,-9],
// 3 1 -3 -0.25 -4.8 -7.19 -0.25 -4.8 -31 -0.25 -9
  [3,1,-3,-0.25,-4.8,-7.19,-0.25,-4.8,-31,-0.25,-9],
// 4 1 31 -0.25 -9 4.56 -0.25 -4.8 0.55 -0.25 -4.8 -31 -0.25 -9
  [4,1,31,-0.25,-9,4.56,-0.25,-4.8,0.55,-0.25,-4.8,-31,-0.25,-9],
// 3 1 7.84 -0.25 -4.8 4.56 -0.25 -4.8 31 -0.25 -9
  [3,1,7.84,-0.25,-4.8,4.56,-0.25,-4.8,31,-0.25,-9],
// 3 1 6.21 -0.25 1.42 4.56 -0.25 -4.8 7.84 -0.25 -4.8
  [3,1,6.21,-0.25,1.42,4.56,-0.25,-4.8,7.84,-0.25,-4.8],
// 3 1 0.55 -0.25 -4.8 -3 -0.25 -4.8 -31 -0.25 -9
  [3,1,0.55,-0.25,-4.8,-3,-0.25,-4.8,-31,-0.25,-9],
// 3 1 15.45 -0.25 -4.8 11.89 -0.25 -4.8 31 -0.25 -9
  [3,1,15.45,-0.25,-4.8,11.89,-0.25,-4.8,31,-0.25,-9],
// 4 1 15.2 -0.25 4.83 11.89 -0.25 -4.8 15.45 -0.25 -4.8 15.45 -0.25 4.83
  [4,1,15.2,-0.25,4.83,11.89,-0.25,-4.8,15.45,-0.25,-4.8,15.45,-0.25,4.83],
// 3 1 11.89 -0.25 -4.8 7.84 -0.25 -4.8 31 -0.25 -9
  [3,1,11.89,-0.25,-4.8,7.84,-0.25,-4.8,31,-0.25,-9],
// 4 1 -3 -0.25 -4.8 0.55 -0.25 -4.8 -2.75 -0.25 4.83 -3 -0.25 4.83
  [4,1,-3,-0.25,-4.8,0.55,-0.25,-4.8,-2.75,-0.25,4.83,-3,-0.25,4.83],
// 3 1 -21.76 -0.25 1.9 -22.99 -0.25 -1.48 -20.6 -0.25 -1.48
  [3,1,-21.76,-0.25,1.9,-22.99,-0.25,-1.48,-20.6,-0.25,-1.48],
// 4 1 -15.41 -0.25 -4.8 -14.75 -0.25 -4.8 -14.75 -0.25 4.83 -19.3 -0.25 4.83
  [4,1,-15.41,-0.25,-4.8,-14.75,-0.25,-4.8,-14.75,-0.25,4.83,-19.3,-0.25,4.83],
// 3 1 -11.23 -0.25 0.84 -11.23 -0.25 -4.8 -7.19 -0.25 -4.8
  [3,1,-11.23,-0.25,0.84,-11.23,-0.25,-4.8,-7.19,-0.25,-4.8],
// 3 1 -31 -0.25 9 -24.04 -0.25 4.83 -19.3 -0.25 4.83
  [3,1,-31,-0.25,9,-24.04,-0.25,4.83,-19.3,-0.25,4.83],
// 3 1 -31 -0.25 9 -19.3 -0.25 4.83 -14.75 -0.25 4.83
  [3,1,-31,-0.25,9,-19.3,-0.25,4.83,-14.75,-0.25,4.83],
// 3 1 -31 -0.25 9 -14.75 -0.25 4.83 -10.33 -0.25 4.83
  [3,1,-31,-0.25,9,-14.75,-0.25,4.83,-10.33,-0.25,4.83],
// 3 1 -31 -0.25 9 -10.33 -0.25 4.83 -6.61 -0.25 4.83
  [3,1,-31,-0.25,9,-10.33,-0.25,4.83,-6.61,-0.25,4.83],
// 3 1 -6.61 -0.25 4.83 -10.33 -0.25 4.83 -6.61 -0.25 -0.72
  [3,1,-6.61,-0.25,4.83,-10.33,-0.25,4.83,-6.61,-0.25,-0.72],
// 3 1 -31 -0.25 9 -6.61 -0.25 4.83 -3 -0.25 4.83
  [3,1,-31,-0.25,9,-6.61,-0.25,4.83,-3,-0.25,4.83],
// 3 1 4.72 -0.25 4.83 1.27 -0.25 4.83 2.94 -0.25 -1.9
  [3,1,4.72,-0.25,4.83,1.27,-0.25,4.83,2.94,-0.25,-1.9],
// 4 1 -31 -0.25 9 -2.75 -0.25 4.83 1.27 -0.25 4.83 31 -0.25 9
  [4,1,-31,-0.25,9,-2.75,-0.25,4.83,1.27,-0.25,4.83,31,-0.25,9],
// 3 1 -31 -0.25 9 -3 -0.25 4.83 -2.75 -0.25 4.83
  [3,1,-31,-0.25,9,-3,-0.25,4.83,-2.75,-0.25,4.83],
// 3 1 31 -0.25 9 1.27 -0.25 4.83 4.72 -0.25 4.83
  [3,1,31,-0.25,9,1.27,-0.25,4.83,4.72,-0.25,4.83],
// 3 1 31 -0.25 9 7.8 -0.25 4.83 11.17 -0.25 4.83
  [3,1,31,-0.25,9,7.8,-0.25,4.83,11.17,-0.25,4.83],
// 3 1 11.17 -0.25 4.83 7.8 -0.25 4.83 9.6 -0.25 -1.9
  [3,1,11.17,-0.25,4.83,7.8,-0.25,4.83,9.6,-0.25,-1.9],
// 3 1 31 -0.25 9 11.17 -0.25 4.83 15.2 -0.25 4.83
  [3,1,31,-0.25,9,11.17,-0.25,4.83,15.2,-0.25,4.83],
// 3 1 31 -0.25 9 4.72 -0.25 4.83 7.8 -0.25 4.83
  [3,1,31,-0.25,9,4.72,-0.25,4.83,7.8,-0.25,4.83],
// 3 1 31 -0.25 9 15.2 -0.25 4.83 15.45 -0.25 4.83
  [3,1,31,-0.25,9,15.2,-0.25,4.83,15.45,-0.25,4.83],
// 4 1 21.83 -0.25 -2.4 22.58 -0.25 -2.35 22.57 -0.25 -0.86 21.83 -0.25 -0.82
  [4,1,21.83,-0.25,-2.4,22.58,-0.25,-2.35,22.57,-0.25,-0.86,21.83,-0.25,-0.82],
// 4 1 19.19 -0.25 -0.82 19.19 -0.25 -2.4 21.83 -0.25 -2.4 21.83 -0.25 -0.82
  [4,1,19.19,-0.25,-0.82,19.19,-0.25,-2.4,21.83,-0.25,-2.4,21.83,-0.25,-0.82],
// 4 1 22.58 -0.25 -2.35 23.01 -0.25 -2.23 23.28 -0.25 -1.62 22.57 -0.25 -0.86
  [4,1,22.58,-0.25,-2.35,23.01,-0.25,-2.23,23.28,-0.25,-1.62,22.57,-0.25,-0.86],
// 3 1 22.57 -0.25 -0.86 23.28 -0.25 -1.62 23 -0.25 -0.99
  [3,1,22.57,-0.25,-0.86,23.28,-0.25,-1.62,23,-0.25,-0.99],
// 3 1 25.69 -0.25 -4.49 24.79 -0.25 -4.72 31 -0.25 -9
  [3,1,25.69,-0.25,-4.49,24.79,-0.25,-4.72,31,-0.25,-9],
// 3 1 26.89 -0.25 -3.58 26.39 -0.25 -4.11 31 -0.25 -9
  [3,1,26.89,-0.25,-3.58,26.39,-0.25,-4.11,31,-0.25,-9],
// 3 1 26.39 -0.25 -4.11 25.69 -0.25 -4.49 31 -0.25 -9
  [3,1,26.39,-0.25,-4.11,25.69,-0.25,-4.49,31,-0.25,-9],
// 3 1 27.19 -0.25 -2.89 26.89 -0.25 -3.58 31 -0.25 -9
  [3,1,27.19,-0.25,-2.89,26.89,-0.25,-3.58,31,-0.25,-9],
// 3 1 24.79 -0.25 -4.72 23.69 -0.25 -4.8 31 -0.25 -9
  [3,1,24.79,-0.25,-4.72,23.69,-0.25,-4.8,31,-0.25,-9],
// 4 1 26.57 -0.25 1.18 26.34 -0.25 -0.03 26.87 -0.25 -0.55 26.81 -0.25 1.76
  [4,1,26.57,-0.25,1.18,26.34,-0.25,-0.03,26.87,-0.25,-0.55,26.81,-0.25,1.76],
// 4 1 27.29 -0.25 -2.05 27.19 -0.25 -2.89 31 -0.25 -9 31 -0.25 9
  [4,1,27.29,-0.25,-2.05,27.19,-0.25,-2.89,31,-0.25,-9,31,-0.25,9],
// 4 1 27.18 -0.25 -1.23 27.29 -0.25 -2.05 31 -0.25 9 26.89 -0.25 2.43
  [4,1,27.18,-0.25,-1.23,27.29,-0.25,-2.05,31,-0.25,9,26.89,-0.25,2.43],
// 4 1 26.81 -0.25 1.76 26.87 -0.25 -0.55 27.18 -0.25 -1.23 26.89 -0.25 2.43
  [4,1,26.81,-0.25,1.76,26.87,-0.25,-0.55,27.18,-0.25,-1.23,26.89,-0.25,2.43],
// 3 1 23.69 -0.25 -4.8 15.45 -0.25 -4.8 31 -0.25 -9
  [3,1,23.69,-0.25,-4.8,15.45,-0.25,-4.8,31,-0.25,-9],
// 4 1 21.69 -0.25 2.57 19.19 -0.25 1.21 21.69 -0.25 1.21 22.36 -0.25 1.25
  [4,1,21.69,-0.25,2.57,19.19,-0.25,1.21,21.69,-0.25,1.21,22.36,-0.25,1.25],
// 4 1 22.36 -0.25 1.25 22.75 -0.25 1.36 22.99 -0.25 1.89 22.39 -0.25 2.54
  [4,1,22.36,-0.25,1.25,22.75,-0.25,1.36,22.99,-0.25,1.89,22.39,-0.25,2.54],
// 3 1 21.69 -0.25 2.57 19.19 -0.25 2.57 19.19 -0.25 1.21
  [3,1,21.69,-0.25,2.57,19.19,-0.25,2.57,19.19,-0.25,1.21],
// 3 1 21.69 -0.25 2.57 22.36 -0.25 1.25 22.39 -0.25 2.54
  [3,1,21.69,-0.25,2.57,22.36,-0.25,1.25,22.39,-0.25,2.54],
// 3 1 22.39 -0.25 2.54 22.99 -0.25 1.89 22.77 -0.25 2.43
  [3,1,22.39,-0.25,2.54,22.99,-0.25,1.89,22.77,-0.25,2.43],
// 3 1 31 -0.25 9 15.45 -0.25 4.83 23.2 -0.25 4.83
  [3,1,31,-0.25,9,15.45,-0.25,4.83,23.2,-0.25,4.83],
// 3 1 26.16 -0.25 0.7 25.61 -0.25 0.32 26.34 -0.25 -0.03
  [3,1,26.16,-0.25,0.7,25.61,-0.25,0.32,26.34,-0.25,-0.03],
// 3 1 26.57 -0.25 1.18 26.16 -0.25 0.7 26.34 -0.25 -0.03
  [3,1,26.57,-0.25,1.18,26.16,-0.25,0.7,26.34,-0.25,-0.03],
// 3 1 31 -0.25 9 24.41 -0.25 4.77 25.37 -0.25 4.58
  [3,1,31,-0.25,9,24.41,-0.25,4.77,25.37,-0.25,4.58],
// 3 1 31 -0.25 9 26.06 -0.25 4.27 26.68 -0.25 3.53
  [3,1,31,-0.25,9,26.06,-0.25,4.27,26.68,-0.25,3.53],
// 3 1 31 -0.25 9 26.68 -0.25 3.53 26.89 -0.25 2.43
  [3,1,31,-0.25,9,26.68,-0.25,3.53,26.89,-0.25,2.43],
// 3 1 31 -0.25 9 25.37 -0.25 4.58 26.06 -0.25 4.27
  [3,1,31,-0.25,9,25.37,-0.25,4.58,26.06,-0.25,4.27],
// 3 1 31 -0.25 9 23.2 -0.25 4.83 24.41 -0.25 4.77
  [3,1,31,-0.25,9,23.2,-0.25,4.83,24.41,-0.25,4.77],
];
module ldraw_lib__194535c(step=0, col=false, unit=2/5, alt=false, line=0.2, solid=!$preview)
    makepoly(ldraw_lib__194535c(solid), step=step, col=col, unit=unit, alt=alt, line=line, solid=solid);
ldraw_lib__194535c(line=0.2);
